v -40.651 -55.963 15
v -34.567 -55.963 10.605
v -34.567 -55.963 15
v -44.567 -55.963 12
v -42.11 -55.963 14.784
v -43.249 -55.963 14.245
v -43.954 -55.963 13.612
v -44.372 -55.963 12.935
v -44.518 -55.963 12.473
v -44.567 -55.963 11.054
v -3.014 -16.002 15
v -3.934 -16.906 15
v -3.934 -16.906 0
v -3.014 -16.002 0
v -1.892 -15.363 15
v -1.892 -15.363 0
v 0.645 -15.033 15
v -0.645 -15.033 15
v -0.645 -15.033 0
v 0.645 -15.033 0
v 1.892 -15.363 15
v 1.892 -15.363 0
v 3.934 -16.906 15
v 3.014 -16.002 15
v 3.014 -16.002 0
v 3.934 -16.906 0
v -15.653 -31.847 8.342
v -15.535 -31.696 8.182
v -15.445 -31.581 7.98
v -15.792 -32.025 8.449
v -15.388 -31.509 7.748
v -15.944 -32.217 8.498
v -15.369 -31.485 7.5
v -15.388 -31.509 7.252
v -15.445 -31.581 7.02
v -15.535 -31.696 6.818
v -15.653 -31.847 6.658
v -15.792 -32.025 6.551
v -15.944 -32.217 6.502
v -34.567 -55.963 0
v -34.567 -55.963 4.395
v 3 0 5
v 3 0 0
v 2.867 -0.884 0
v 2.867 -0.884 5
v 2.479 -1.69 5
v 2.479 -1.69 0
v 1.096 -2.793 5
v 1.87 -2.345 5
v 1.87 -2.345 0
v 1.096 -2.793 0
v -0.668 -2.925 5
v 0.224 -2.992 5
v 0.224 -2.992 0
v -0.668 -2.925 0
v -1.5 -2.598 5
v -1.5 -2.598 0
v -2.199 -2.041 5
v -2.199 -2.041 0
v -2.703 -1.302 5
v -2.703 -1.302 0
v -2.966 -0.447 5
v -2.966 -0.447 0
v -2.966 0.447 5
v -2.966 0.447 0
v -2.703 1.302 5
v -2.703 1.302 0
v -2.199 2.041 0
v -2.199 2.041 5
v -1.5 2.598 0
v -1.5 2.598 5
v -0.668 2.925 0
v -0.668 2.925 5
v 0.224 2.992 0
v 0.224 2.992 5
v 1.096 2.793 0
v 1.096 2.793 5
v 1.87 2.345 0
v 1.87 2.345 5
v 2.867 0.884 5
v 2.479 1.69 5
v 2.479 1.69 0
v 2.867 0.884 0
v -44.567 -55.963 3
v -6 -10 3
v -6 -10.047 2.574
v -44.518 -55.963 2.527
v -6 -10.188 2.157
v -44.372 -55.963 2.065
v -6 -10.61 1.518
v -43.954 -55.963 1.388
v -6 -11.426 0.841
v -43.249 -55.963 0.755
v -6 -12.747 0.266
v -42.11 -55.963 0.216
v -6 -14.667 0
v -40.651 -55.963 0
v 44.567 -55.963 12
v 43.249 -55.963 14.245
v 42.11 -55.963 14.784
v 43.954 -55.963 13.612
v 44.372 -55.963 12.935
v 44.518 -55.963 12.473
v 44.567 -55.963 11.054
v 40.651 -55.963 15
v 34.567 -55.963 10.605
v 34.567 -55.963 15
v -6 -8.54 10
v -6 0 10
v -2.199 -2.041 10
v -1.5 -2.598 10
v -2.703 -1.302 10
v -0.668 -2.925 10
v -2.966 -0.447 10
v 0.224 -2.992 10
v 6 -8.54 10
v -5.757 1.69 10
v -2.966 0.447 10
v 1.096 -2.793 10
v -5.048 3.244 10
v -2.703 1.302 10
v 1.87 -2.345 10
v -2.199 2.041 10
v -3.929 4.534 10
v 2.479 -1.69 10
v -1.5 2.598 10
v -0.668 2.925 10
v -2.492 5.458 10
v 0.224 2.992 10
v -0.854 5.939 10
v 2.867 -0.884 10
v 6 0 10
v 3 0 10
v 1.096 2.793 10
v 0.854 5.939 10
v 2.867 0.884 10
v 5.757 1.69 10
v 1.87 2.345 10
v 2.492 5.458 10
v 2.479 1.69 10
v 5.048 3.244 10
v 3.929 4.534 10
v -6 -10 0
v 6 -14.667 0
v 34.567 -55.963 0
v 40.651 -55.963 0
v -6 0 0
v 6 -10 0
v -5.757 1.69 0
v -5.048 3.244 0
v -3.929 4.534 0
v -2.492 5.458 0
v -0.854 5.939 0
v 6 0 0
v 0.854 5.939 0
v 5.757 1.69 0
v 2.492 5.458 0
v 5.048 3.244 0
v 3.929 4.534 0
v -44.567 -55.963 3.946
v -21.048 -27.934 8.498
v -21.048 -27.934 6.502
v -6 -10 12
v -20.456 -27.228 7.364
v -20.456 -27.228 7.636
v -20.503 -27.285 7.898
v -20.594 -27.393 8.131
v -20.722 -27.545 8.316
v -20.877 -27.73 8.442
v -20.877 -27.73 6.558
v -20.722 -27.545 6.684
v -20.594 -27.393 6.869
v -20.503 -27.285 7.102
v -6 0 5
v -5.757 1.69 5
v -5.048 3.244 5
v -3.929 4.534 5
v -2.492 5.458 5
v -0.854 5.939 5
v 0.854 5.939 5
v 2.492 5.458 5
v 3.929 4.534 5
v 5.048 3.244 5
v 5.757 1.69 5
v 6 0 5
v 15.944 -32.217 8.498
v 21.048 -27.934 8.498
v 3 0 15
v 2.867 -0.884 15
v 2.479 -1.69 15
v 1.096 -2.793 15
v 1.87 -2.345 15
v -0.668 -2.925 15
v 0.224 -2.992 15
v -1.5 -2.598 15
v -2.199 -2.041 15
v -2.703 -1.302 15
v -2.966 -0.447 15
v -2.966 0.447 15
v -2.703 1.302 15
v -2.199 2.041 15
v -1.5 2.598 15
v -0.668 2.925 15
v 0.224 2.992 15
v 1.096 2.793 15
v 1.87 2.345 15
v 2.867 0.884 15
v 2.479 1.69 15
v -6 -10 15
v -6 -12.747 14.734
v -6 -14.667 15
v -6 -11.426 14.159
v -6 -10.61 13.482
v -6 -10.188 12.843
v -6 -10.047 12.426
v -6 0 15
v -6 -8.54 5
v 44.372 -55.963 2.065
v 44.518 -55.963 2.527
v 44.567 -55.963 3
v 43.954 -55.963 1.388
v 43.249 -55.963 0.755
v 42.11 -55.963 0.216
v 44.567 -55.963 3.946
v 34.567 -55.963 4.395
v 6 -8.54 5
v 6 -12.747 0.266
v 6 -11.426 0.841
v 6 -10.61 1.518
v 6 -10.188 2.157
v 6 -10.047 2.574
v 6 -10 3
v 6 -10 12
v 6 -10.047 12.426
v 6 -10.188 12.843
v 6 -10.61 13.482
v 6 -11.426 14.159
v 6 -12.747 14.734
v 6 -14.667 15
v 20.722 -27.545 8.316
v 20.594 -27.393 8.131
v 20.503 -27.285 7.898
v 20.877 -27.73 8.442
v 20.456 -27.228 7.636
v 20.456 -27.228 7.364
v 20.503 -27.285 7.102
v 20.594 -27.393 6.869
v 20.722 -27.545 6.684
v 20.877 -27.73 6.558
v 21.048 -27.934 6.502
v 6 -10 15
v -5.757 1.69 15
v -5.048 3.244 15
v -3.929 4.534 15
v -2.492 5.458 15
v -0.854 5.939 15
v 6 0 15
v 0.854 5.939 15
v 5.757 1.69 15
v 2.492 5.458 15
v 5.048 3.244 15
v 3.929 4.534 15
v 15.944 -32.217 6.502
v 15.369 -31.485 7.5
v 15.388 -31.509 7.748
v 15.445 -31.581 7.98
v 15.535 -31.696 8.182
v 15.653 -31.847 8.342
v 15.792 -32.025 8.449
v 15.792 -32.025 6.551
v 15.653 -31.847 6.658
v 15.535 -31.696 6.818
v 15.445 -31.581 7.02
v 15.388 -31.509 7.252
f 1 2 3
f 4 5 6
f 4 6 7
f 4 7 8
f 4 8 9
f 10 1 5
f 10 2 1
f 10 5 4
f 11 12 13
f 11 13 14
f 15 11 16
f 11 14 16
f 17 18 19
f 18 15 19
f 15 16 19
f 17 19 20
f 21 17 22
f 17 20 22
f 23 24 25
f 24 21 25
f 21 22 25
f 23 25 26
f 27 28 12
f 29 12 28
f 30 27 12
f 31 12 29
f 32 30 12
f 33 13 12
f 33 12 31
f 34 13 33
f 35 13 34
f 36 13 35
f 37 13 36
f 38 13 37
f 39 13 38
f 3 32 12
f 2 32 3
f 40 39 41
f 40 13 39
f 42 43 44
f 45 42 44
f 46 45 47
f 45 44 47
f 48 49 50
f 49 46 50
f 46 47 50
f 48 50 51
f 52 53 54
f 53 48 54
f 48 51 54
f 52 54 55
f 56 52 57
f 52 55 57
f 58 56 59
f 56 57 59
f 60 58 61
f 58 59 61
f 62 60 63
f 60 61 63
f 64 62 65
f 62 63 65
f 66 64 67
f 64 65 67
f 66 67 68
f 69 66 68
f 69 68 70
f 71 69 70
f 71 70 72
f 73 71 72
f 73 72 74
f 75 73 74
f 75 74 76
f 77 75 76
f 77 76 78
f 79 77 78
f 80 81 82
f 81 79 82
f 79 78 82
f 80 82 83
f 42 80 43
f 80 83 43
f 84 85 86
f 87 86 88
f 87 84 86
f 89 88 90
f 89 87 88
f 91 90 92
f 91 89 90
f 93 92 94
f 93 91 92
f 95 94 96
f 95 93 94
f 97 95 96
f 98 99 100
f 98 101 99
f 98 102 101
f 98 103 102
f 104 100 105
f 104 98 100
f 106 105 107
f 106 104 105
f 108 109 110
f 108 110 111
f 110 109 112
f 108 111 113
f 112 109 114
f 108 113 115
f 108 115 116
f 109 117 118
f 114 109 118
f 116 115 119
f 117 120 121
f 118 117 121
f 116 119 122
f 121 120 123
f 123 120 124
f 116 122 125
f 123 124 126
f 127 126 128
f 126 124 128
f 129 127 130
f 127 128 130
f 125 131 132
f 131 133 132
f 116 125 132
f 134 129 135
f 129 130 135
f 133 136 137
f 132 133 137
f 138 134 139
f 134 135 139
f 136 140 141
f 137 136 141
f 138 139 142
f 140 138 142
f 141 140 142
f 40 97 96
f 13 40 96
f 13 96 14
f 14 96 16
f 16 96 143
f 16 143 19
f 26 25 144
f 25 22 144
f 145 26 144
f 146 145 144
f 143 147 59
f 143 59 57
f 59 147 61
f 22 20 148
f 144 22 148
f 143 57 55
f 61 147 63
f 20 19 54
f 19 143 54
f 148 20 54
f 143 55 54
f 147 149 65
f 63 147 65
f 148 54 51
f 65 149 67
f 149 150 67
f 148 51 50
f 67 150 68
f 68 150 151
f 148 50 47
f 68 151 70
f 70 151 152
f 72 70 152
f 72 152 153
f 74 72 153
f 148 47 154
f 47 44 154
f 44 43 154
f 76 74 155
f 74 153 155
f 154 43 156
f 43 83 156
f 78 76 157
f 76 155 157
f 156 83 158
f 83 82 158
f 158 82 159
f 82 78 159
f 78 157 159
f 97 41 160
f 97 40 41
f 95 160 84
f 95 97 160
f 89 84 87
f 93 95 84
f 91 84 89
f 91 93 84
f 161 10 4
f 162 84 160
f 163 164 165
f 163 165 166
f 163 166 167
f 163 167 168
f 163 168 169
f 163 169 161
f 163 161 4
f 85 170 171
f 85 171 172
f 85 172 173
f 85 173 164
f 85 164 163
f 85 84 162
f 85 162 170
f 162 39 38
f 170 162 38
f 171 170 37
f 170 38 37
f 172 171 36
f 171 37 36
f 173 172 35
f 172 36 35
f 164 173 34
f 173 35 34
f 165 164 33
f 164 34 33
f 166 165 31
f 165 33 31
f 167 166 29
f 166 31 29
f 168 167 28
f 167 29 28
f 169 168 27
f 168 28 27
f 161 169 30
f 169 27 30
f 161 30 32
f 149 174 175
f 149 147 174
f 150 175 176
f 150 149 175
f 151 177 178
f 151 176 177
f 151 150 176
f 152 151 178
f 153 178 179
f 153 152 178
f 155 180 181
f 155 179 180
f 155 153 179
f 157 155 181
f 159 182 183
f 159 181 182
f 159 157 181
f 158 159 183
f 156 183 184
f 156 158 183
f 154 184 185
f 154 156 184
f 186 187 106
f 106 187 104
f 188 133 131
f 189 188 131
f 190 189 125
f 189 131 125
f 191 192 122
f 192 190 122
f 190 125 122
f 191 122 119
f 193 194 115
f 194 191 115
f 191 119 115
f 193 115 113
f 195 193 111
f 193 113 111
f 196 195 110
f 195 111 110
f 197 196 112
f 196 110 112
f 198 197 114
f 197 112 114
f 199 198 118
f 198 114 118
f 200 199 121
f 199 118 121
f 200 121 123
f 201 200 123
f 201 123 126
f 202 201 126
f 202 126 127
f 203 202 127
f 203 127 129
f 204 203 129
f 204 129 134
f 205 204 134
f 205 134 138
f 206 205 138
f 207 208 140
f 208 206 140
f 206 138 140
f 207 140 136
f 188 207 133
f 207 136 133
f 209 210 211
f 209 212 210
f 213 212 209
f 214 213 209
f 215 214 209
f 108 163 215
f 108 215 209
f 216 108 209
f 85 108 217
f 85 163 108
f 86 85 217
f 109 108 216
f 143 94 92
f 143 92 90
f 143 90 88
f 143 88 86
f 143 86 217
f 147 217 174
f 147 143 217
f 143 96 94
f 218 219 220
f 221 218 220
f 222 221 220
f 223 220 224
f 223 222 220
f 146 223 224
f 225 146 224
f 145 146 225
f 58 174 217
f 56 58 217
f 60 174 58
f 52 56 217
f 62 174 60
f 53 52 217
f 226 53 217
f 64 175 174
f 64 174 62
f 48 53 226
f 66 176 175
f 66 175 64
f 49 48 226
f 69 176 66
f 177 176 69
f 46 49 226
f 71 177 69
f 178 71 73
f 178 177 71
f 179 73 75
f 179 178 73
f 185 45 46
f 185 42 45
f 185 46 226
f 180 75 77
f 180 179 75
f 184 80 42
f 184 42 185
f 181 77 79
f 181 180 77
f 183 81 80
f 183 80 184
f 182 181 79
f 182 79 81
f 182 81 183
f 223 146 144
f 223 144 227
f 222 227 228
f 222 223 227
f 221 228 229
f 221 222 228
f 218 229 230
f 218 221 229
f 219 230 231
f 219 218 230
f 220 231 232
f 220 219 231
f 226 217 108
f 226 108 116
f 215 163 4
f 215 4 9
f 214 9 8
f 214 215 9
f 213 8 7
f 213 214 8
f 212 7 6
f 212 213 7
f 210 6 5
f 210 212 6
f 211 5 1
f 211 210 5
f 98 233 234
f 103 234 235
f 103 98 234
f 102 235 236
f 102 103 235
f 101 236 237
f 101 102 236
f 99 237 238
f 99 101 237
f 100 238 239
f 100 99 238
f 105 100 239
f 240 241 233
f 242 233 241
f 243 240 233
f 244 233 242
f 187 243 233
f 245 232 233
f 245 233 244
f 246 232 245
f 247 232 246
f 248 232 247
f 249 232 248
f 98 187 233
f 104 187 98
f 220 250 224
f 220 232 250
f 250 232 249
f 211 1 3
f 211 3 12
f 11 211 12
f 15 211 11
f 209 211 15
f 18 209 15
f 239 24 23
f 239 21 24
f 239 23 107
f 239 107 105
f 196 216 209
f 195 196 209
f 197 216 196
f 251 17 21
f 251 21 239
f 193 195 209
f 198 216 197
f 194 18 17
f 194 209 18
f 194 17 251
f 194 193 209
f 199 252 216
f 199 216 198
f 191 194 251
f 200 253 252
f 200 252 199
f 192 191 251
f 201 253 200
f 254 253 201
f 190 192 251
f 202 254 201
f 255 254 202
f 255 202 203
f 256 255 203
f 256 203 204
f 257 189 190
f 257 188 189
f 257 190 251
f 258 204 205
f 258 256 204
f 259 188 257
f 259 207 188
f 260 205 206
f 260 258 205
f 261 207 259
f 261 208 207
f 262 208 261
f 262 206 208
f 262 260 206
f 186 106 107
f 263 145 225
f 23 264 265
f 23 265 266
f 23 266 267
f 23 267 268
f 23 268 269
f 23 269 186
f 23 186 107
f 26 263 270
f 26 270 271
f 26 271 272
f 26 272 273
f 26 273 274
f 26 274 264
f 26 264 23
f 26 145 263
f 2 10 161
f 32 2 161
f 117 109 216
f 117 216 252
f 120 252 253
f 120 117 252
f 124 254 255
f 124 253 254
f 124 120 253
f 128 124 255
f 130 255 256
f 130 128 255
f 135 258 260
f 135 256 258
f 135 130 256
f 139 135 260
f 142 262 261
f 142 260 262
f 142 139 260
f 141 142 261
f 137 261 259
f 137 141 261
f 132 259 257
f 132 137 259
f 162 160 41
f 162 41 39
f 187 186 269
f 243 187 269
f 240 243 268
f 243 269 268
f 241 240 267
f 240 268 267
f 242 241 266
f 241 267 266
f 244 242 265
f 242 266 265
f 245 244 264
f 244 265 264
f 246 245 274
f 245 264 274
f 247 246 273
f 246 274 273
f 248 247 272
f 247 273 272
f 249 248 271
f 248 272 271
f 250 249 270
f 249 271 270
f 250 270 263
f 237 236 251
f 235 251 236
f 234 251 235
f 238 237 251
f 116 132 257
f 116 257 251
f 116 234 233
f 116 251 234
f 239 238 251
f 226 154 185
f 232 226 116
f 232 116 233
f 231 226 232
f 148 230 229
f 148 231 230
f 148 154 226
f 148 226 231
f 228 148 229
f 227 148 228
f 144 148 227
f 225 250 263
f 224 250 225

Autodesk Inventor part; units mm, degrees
ref_plane "YZ Plane" through (0, 0, 0) normal (1, 0, 0) x (0, 1, 0)
ref_plane "XZ Plane" through (0, 0, 0) normal (0, 1, 0) x (-1, 0, 0)
ref_plane "XY Plane" through (0, 0, 0) normal (0, 0, 1) x (1, 0, 0)
sketch "Szkic1" plane through (0, 0, 0) normal (0, 0, 1) x (1, 0, 0)
  circle A0 centre (0, 0) radius 3
  arc A1 (6, 0) -> (-6, 0) centre (0, 0) ccw
  line L0 (-6, 0) -> (-6, -10)
  line L1 (6, 0) -> (6, -10)
  line L2 (6, -10) -> (44.5673, -55.9627)
  line L3 (44.5673, -55.9627) -> (34.5673, -55.9627)
  line L4 (34.5673, -55.9627) -> (0, -11.8894)
  line L5 (0, 0) -> (0, -6.4969) construction
  line L6 (-6, 0) -> (-6, -10)
  line L7 (-6, -10) -> (-44.5673, -55.9627)
  line L8 (-44.5673, -55.9627) -> (-34.5673, -55.9627)
  line L9 (-34.5673, -55.9627) -> (0, -11.8894)
  dimension "d0" = 6
  dimension "d1" = 12
  dimension "d2" = 10
  dimension "d3" = 10
  dimension "d4" = 60
  dimension "d5" = 140
  dimension "d6" = 10
extrude "Wyciągnięcie proste1" add sketch "Szkic1" along normal blind 5
sketch "Szkic2" plane through (0, 0, 5) normal (0, 0, 1) x (1, 0, 0)
  circle A0 centre (0, 0) radius 3 construction
  line L0 (-6, 0) -> (-6, -10) construction
  line L1 (-6, -10) -> (-44.5673, -55.9627) projected
  line L2 (-44.5673, -55.9627) -> (-34.5673, -55.9627) projected
  line L3 (-34.5673, -55.9627) -> (0, -11.8894) projected
  line L4 (0, -11.8894) -> (34.5673, -55.9627) projected
  line L5 (34.5673, -55.9627) -> (44.5673, -55.9627) projected
  line L6 (44.5673, -55.9627) -> (6, -10) projected
  line L7 (6, -10) -> (6, 0) construction
  arc A1 (6, 0) -> (-6, 0) centre (0, 0) ccw construction
  line L8 (-6, 0) -> (-6, -10) construction
  line L9 (-6, -8.5404) -> (6, -8.5404)
  line L10 (-6, -10) -> (-6, -8.5404)
  line L11 (6, -10) -> (6, -8.5404)
  line L12 (6, -10) -> (6, 0) projected
extrude "Wyciągnięcie proste2" add sketch "Szkic2" along normal blind 5
sketch "Szkic3" plane through (0, 0, 10) normal (0, 0, 1) x (1, 0, 0)
  circle A0 centre (0, 0) radius 3 projected
  line L0 (-6, -10) -> (-6, 0) projected
  arc A1 (6, 0) -> (-6, 0) centre (0, 0) ccw projected
  line L1 (6, 0) -> (6, -10) projected
  line L2 (6, -10) -> (44.5673, -55.9627) projected
  line L3 (44.5673, -55.9627) -> (34.5673, -55.9627) projected
  line L4 (34.5673, -55.9627) -> (0, -11.8894) projected
  line L5 (0, -11.8894) -> (-34.5673, -55.9627) projected
  line L6 (-34.5673, -55.9627) -> (-44.5673, -55.9627) projected
  line L7 (-44.5673, -55.9627) -> (-6, -10) projected
extrude "Wyciągnięcie proste3" add sketch "Szkic3" along normal blind 5
sketch "Szkic4" plane through (-44.5673, -55.9627, 0) normal (-0.766, 0.6428, 0) x (0, 0, 1)
  line L0 (0, 0) -> (15, 0) projected
  line L1 (11.054, 0) -> (7.5, 50.8667)
  line L2 (0, 50.8667) -> (15, 50.8667) projected
  line L3 (5, 61.1181) -> (10, 61.1181) construction
  line L4 (7.5, 61.1181) -> (7.5, 50.8667) construction
  line L5 (3.946, 0) -> (7.5, 50.8667)
  line L6 (3.946, 0) -> (11.054, 0)
  point P0 (0, 71.5172)
extrude "Wyciągnięcie proste4" cut sketch "Szkic4" against normal blind 25.75
mirror "Odbij1" about plane through (0, 0, 0) normal (1, 0, 0) of "Wyciągnięcie proste4"
fillet "Zaokrąglenie1" radius 5 1 edges at (0, -11.8894, 7.5)
fillet "Zaokrąglenie2" radius 1 1 edges at (9.4991, -18.9866, 7.5)
fillet "Zaokrąglenie3" radius 1 1 edges at (-9.4991, -18.9866, 7.5)
fillet "Zaokrąglenie4" radius 3 4 edges at (-25.2836, -32.9813, 0) (-25.2836, -32.9813, 15) (25.2836, -32.9813, 15) (25.2836, -32.9813, 0)
properties part number "noga"
